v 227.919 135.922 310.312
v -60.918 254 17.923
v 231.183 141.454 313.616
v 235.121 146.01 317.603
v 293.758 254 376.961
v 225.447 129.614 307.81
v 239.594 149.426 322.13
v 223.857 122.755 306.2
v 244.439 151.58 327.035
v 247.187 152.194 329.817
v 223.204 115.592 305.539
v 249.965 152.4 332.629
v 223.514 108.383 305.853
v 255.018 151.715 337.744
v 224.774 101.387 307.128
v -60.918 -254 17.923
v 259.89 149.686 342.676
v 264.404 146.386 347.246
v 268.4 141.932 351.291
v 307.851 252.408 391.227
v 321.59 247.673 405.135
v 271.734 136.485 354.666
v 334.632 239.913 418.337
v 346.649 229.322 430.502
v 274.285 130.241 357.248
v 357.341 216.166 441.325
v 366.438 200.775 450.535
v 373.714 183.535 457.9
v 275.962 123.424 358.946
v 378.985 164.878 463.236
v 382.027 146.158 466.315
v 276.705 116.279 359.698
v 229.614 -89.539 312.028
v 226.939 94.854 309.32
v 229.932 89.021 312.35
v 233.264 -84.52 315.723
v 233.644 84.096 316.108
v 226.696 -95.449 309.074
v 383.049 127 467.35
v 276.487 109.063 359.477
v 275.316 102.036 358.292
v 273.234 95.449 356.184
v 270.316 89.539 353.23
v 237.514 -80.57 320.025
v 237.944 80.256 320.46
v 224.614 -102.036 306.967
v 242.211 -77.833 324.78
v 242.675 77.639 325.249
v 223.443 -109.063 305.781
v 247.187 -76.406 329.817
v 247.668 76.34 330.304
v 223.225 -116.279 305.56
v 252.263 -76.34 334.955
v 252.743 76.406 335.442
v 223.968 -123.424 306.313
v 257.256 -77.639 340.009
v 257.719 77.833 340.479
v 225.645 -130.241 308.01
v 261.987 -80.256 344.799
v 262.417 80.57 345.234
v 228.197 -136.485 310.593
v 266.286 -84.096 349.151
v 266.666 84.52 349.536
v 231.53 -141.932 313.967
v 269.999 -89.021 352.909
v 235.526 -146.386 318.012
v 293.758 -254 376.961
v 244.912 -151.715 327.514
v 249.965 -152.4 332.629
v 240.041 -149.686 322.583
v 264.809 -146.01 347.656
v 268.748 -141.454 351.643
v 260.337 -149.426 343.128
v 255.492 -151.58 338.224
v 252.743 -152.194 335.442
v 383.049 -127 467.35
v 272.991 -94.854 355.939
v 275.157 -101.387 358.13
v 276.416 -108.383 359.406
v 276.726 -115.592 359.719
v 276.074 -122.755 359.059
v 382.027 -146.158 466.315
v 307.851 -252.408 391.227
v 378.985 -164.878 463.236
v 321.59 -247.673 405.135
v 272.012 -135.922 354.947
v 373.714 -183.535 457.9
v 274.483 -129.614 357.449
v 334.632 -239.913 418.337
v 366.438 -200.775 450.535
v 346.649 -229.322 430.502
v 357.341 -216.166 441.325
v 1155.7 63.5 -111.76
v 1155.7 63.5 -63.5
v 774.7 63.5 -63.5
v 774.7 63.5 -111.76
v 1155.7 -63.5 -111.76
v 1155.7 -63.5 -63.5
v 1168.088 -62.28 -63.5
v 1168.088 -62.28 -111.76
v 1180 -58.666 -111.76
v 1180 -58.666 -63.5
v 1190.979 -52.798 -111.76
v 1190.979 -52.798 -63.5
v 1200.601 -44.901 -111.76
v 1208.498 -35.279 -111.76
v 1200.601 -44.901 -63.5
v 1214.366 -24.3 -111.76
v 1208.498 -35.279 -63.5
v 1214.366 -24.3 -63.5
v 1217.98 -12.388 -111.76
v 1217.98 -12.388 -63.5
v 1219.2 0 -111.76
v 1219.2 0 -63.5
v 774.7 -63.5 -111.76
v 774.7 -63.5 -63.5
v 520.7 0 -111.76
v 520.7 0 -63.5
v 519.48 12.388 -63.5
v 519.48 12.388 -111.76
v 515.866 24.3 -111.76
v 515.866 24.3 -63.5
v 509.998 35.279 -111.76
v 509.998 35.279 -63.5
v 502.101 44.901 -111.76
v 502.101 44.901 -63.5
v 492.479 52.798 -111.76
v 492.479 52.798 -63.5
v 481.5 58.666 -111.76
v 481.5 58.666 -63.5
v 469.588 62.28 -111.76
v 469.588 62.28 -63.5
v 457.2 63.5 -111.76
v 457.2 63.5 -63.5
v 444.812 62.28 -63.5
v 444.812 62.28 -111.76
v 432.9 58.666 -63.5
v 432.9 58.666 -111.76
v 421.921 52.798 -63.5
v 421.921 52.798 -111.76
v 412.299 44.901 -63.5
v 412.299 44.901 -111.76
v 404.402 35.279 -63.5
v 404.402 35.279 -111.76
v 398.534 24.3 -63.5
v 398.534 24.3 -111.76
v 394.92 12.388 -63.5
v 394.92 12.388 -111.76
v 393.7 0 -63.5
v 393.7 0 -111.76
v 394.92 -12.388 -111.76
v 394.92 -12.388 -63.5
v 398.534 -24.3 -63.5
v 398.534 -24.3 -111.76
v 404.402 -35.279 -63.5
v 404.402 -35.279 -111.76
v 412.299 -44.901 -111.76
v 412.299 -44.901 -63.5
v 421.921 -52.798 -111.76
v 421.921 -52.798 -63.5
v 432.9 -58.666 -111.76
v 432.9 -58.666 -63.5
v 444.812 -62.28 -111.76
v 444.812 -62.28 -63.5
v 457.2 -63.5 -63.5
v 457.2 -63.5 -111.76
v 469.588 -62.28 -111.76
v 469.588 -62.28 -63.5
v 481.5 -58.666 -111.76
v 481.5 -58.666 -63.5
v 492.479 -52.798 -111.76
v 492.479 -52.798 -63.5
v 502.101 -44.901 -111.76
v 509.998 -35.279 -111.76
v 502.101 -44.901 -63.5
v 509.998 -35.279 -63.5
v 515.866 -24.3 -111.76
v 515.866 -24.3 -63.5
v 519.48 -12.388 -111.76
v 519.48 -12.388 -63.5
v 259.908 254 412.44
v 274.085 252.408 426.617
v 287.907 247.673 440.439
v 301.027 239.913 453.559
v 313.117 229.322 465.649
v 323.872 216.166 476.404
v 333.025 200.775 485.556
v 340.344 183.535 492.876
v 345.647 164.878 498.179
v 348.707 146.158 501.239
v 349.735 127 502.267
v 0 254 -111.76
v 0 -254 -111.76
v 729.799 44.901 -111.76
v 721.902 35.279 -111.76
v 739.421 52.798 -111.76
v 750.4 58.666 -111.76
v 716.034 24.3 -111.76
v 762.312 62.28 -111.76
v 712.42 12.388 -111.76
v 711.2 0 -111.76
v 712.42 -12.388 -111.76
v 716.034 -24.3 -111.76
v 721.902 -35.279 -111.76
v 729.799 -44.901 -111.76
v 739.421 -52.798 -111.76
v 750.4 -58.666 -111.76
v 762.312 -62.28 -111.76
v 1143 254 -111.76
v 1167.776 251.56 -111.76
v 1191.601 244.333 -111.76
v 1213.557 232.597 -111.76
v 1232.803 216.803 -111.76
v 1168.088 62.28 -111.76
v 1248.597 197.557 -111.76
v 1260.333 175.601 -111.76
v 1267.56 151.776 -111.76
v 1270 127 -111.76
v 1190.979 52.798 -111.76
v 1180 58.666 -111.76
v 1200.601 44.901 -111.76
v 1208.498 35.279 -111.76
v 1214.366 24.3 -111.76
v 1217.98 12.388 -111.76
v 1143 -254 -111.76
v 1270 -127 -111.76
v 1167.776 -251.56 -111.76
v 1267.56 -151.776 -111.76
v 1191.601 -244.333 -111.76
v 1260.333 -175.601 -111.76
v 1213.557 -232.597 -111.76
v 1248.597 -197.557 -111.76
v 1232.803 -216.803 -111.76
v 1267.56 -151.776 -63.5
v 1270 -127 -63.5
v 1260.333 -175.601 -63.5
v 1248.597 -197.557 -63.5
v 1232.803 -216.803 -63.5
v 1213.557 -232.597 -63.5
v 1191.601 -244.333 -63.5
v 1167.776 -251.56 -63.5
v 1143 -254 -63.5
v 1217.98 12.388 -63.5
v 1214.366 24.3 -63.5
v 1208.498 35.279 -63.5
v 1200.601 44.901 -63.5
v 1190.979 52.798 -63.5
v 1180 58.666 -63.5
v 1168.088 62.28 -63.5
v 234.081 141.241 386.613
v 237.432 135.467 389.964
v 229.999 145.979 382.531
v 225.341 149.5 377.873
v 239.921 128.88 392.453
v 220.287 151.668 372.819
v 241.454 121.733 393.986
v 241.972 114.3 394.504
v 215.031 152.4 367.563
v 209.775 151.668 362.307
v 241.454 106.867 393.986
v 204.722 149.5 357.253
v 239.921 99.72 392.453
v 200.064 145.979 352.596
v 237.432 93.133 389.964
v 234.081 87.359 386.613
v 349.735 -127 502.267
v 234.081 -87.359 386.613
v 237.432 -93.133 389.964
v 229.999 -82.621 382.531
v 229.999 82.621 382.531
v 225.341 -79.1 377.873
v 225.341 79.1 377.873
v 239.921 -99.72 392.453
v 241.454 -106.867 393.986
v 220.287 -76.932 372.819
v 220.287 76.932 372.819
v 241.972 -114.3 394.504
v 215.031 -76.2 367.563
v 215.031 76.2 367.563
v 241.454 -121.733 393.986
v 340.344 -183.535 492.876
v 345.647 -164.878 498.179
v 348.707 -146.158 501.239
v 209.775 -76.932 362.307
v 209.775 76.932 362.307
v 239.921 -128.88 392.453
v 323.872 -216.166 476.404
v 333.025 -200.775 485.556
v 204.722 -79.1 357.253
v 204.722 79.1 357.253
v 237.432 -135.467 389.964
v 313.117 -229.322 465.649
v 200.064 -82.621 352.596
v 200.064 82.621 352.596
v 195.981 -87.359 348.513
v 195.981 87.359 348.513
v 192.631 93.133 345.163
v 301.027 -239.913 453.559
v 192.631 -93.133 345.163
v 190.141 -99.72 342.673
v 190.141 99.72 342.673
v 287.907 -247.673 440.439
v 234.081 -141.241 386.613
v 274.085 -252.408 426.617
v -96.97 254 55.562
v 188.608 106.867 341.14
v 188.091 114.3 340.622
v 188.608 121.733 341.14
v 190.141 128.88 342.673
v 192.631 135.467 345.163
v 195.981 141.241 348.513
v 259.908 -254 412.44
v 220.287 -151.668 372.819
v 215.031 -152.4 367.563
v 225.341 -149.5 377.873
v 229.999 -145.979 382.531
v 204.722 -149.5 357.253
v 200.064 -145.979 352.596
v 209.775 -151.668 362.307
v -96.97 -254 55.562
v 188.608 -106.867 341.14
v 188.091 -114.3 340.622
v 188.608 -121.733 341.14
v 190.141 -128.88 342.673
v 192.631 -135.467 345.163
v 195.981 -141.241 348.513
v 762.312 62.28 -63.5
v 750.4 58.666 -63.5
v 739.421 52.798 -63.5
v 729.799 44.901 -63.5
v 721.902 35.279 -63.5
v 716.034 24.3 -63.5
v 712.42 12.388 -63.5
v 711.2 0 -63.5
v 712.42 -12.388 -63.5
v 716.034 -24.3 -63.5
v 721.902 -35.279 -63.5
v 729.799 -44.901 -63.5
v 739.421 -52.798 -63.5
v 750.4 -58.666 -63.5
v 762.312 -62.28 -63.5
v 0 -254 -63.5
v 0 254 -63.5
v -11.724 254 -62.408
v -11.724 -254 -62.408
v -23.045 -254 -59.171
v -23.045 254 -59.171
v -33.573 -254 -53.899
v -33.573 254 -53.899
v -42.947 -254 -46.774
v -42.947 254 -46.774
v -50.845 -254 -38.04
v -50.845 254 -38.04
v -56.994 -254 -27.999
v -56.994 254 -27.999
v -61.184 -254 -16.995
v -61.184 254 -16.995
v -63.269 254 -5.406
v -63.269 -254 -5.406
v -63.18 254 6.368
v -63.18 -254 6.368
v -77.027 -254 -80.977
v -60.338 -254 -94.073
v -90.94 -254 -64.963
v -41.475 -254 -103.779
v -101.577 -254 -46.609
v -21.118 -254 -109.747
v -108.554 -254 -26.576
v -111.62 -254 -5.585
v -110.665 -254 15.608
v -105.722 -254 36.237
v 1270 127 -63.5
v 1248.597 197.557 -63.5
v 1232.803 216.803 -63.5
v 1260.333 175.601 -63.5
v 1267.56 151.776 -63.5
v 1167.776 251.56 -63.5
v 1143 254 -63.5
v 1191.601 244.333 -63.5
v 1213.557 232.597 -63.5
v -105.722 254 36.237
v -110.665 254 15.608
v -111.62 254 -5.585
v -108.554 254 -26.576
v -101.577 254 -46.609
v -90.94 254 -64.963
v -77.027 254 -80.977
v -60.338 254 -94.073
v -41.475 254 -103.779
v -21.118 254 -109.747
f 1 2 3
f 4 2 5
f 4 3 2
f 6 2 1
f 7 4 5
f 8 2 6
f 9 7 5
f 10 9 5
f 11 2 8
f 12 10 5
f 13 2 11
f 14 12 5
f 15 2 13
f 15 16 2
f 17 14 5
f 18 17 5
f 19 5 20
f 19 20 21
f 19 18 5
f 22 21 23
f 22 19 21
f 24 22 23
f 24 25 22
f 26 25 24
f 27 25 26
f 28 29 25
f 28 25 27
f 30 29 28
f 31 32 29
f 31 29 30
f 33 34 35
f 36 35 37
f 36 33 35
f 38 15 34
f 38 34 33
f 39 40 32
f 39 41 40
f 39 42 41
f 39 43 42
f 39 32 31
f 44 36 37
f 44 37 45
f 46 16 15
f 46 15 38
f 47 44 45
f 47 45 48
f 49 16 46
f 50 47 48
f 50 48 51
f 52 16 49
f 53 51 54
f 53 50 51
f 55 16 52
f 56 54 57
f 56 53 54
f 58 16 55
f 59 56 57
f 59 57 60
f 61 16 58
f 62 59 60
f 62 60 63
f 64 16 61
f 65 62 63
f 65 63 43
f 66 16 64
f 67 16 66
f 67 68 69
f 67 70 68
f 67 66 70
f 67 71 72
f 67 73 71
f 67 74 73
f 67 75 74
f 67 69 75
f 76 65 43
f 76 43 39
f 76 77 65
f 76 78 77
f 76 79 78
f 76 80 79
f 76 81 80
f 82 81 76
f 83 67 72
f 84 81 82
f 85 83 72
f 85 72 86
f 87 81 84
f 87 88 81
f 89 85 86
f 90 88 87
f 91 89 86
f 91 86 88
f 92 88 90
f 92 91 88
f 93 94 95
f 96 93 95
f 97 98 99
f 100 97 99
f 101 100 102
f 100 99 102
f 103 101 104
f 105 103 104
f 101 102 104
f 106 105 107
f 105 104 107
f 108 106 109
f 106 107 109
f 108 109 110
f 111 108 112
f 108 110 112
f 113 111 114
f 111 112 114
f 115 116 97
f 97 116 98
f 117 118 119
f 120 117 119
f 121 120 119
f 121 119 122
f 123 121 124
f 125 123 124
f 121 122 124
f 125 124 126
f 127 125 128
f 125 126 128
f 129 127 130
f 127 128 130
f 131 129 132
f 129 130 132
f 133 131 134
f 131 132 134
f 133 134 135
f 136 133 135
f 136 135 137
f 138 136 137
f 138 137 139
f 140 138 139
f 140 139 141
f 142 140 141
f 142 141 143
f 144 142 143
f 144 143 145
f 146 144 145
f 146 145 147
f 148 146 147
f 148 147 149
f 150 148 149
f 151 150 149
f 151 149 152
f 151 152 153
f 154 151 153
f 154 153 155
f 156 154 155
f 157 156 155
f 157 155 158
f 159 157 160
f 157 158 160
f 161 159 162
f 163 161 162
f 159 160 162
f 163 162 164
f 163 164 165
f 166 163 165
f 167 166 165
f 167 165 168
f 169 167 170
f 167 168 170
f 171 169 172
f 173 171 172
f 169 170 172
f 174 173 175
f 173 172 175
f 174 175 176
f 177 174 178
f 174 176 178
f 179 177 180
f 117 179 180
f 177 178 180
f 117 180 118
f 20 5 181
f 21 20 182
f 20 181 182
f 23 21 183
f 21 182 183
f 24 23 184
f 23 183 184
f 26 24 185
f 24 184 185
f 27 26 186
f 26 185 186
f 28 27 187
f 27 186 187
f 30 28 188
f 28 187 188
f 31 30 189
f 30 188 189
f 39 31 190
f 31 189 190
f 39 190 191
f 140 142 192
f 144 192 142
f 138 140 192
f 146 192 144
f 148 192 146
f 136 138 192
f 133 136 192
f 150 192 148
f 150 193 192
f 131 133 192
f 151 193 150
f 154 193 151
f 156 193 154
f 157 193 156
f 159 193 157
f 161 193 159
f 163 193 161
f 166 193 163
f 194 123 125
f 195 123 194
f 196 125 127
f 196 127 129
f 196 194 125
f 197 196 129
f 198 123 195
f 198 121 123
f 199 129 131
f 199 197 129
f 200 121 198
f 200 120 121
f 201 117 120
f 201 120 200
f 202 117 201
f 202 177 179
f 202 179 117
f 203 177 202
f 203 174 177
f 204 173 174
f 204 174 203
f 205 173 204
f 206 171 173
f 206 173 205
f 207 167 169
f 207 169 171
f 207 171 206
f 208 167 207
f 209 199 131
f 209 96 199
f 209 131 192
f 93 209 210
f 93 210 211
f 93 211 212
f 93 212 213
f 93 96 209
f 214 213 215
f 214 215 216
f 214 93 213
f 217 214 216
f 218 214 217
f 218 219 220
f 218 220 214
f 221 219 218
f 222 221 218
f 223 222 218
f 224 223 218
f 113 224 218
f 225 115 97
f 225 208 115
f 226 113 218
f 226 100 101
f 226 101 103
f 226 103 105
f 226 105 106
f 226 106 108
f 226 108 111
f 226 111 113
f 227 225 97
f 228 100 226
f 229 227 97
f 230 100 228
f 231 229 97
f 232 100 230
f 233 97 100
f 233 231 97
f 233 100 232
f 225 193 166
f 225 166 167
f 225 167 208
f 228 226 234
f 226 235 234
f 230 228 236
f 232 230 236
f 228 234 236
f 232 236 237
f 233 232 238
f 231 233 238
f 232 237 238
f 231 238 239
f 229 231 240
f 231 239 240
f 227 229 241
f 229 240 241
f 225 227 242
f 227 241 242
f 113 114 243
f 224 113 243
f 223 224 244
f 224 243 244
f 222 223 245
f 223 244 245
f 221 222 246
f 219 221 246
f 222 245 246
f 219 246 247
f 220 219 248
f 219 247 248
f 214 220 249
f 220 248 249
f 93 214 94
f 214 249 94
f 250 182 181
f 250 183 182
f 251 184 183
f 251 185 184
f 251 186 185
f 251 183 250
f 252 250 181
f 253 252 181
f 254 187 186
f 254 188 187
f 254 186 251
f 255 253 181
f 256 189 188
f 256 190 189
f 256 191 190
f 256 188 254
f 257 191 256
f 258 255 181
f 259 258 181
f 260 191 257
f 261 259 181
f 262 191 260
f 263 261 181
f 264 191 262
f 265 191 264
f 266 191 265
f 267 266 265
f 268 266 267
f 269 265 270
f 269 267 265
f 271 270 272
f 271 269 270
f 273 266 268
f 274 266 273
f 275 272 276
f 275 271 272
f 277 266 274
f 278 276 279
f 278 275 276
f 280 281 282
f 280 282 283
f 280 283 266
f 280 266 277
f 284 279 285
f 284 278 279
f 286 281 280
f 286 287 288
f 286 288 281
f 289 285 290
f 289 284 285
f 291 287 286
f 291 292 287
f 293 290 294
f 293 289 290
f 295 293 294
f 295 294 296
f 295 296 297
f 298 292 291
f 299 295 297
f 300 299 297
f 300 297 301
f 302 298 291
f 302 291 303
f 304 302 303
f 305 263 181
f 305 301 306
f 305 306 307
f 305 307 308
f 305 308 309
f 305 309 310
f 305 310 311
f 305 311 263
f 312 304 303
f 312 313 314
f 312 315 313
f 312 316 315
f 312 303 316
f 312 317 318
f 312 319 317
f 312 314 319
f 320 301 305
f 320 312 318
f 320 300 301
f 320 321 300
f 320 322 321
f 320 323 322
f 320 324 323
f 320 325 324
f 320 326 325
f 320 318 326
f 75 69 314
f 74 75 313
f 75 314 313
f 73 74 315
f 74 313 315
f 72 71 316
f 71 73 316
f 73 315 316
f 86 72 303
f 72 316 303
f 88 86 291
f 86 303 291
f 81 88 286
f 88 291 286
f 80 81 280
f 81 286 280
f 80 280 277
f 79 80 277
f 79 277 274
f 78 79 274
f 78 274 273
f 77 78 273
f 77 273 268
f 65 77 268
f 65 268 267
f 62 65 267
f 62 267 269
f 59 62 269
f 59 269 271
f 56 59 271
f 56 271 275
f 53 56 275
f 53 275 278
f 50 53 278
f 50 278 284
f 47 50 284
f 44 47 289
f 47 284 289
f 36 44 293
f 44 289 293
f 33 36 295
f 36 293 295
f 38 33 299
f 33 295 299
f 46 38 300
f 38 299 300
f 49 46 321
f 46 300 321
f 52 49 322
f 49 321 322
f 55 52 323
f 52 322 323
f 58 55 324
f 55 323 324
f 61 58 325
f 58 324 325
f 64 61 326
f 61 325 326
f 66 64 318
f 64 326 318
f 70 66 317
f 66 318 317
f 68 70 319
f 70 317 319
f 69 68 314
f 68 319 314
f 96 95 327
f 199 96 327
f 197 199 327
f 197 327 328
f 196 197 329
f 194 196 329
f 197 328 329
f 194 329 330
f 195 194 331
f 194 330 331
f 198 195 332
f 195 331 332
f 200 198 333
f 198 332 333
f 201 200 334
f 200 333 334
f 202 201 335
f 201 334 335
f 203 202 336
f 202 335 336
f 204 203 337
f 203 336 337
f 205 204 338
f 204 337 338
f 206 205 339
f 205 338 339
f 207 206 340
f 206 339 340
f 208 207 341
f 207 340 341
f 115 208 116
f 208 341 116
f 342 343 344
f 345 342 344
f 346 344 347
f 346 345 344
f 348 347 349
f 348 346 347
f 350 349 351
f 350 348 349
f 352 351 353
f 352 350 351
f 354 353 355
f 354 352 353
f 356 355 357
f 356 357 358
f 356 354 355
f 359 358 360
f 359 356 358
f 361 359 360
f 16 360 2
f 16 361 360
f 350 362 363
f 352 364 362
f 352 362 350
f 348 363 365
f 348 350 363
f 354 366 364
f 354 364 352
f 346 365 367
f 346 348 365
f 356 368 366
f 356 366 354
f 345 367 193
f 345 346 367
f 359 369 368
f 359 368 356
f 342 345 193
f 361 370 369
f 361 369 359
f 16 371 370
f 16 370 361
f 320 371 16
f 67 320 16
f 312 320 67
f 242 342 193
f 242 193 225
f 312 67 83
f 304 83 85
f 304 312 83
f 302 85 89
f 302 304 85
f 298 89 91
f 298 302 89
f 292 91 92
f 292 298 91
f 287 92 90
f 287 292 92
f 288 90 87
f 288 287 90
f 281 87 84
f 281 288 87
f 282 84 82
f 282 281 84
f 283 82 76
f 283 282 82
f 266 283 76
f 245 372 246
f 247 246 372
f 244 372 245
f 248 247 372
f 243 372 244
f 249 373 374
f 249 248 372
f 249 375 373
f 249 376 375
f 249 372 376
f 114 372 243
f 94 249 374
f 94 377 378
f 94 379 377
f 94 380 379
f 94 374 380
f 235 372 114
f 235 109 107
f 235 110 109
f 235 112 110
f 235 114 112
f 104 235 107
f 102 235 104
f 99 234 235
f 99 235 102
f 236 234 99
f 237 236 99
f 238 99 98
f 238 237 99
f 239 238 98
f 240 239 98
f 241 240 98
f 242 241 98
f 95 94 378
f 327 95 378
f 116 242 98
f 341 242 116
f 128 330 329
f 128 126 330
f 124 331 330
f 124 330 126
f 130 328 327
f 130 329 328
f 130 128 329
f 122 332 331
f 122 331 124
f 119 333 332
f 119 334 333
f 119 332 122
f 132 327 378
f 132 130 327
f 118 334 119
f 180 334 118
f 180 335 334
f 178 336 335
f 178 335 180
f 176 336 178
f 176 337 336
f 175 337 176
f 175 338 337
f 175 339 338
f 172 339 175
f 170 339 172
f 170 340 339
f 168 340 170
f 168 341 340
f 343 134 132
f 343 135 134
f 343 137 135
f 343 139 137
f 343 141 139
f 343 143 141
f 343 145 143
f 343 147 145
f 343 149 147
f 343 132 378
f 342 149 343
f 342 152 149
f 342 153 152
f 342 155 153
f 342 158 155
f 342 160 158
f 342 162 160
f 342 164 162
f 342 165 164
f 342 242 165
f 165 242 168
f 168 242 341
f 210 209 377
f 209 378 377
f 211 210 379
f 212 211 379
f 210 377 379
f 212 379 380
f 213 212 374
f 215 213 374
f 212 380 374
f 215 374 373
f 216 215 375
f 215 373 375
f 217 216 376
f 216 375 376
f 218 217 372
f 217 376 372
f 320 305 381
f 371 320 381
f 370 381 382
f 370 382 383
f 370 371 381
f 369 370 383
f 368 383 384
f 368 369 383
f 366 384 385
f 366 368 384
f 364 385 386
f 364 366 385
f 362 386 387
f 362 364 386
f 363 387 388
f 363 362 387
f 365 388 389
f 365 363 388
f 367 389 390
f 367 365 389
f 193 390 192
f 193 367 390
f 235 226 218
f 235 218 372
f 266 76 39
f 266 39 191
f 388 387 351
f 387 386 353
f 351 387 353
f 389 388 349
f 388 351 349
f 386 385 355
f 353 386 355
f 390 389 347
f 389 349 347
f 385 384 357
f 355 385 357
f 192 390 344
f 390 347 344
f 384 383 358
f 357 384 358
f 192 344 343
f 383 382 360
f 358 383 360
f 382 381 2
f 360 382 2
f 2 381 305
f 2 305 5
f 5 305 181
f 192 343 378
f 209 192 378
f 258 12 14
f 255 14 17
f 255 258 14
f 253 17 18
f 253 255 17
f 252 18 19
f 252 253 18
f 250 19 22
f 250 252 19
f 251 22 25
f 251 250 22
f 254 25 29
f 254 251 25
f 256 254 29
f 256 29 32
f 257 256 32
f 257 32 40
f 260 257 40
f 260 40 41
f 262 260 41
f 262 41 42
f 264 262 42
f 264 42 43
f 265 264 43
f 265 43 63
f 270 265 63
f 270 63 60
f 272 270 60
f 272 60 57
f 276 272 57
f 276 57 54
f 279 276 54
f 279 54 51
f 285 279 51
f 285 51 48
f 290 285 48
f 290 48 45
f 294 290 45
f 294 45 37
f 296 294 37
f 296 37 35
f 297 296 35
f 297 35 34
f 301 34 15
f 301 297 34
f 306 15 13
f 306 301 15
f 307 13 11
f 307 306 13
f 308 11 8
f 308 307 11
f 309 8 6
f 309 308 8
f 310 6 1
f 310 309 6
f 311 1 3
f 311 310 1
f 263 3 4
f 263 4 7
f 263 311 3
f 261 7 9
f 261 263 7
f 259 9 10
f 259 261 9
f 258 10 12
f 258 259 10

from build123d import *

# Parameters (mm, degrees)
F1_DEPTH = 254
F2_R     = 63.5
F3_DEPTH = 48.261
F4_R     = 38.1
F5_DEPTH = 49.6377001669
F6_R     = 127
F7_R     = 127


# Not quite as in the source:
# - a pattern or mirror of a feature is missing from the dataset's text; its kind, count and spacing are read off the source's solid


with BuildPart() as f1:
    # F0 (on Front) → F1 (new body, symmetric)
    with BuildSketch(Plane.XZ):
        with BuildLine():
            Line((1270, -63.5), (0, -63.5))
            ThreePointArc((0, -63.5), (-50.8447137485, -38.0403086717), (-60.9180663091, 17.9231469658))
            Line((-60.9180663091, 17.9231469658), (383.0492185975, 467.3498327088))
            Line((383.0492185975, 467.3498327088), (349.7351963182, 502.2669276563))
            Line((349.7351963182, 502.2669276563), (-96.9701293302, 55.5616020078))
            ThreePointArc((-96.9701293302, 55.5616020078), (-96.6950418594, -56.0389728653), (0, -111.76))
            Line((0, -111.76), (1270, -111.76))
            Line((1270, -111.76), (1270, -63.5))
        make_face()
    extrude(amount=F1_DEPTH, both=True)

    # F2 (on face) → F3 (cut, through all)
    with BuildSketch(Plane.XY.offset(-63.5)):
        with BuildLine():
            ThreePointArc((1155.7, -63.5), (1200.6012806053, -44.9012806053), (1219.2, 0))
            ThreePointArc((1219.2, 0), (1200.6012806053, 44.9012806053), (1155.7, 63.5))
            ThreePointArc((1155.7, 63.5), (1092.2, 0), (1155.7, -63.5))
        make_face()
        with BuildLine():
            ThreePointArc((1155.7, -63.5), (1092.2, 0), (1155.7, 63.5))
            Line((1155.7, 63.5), (774.7, 63.5))
            ThreePointArc((774.7, 63.5), (819.6012806053, 44.9012806053), (838.2, 0))
            ThreePointArc((838.2, 0), (819.6012806053, -44.9012806053), (774.7, -63.5))
            Line((774.7, -63.5), (1155.7, -63.5))
        make_face()
        with BuildLine():
            ThreePointArc((838.2, 0), (819.6012806053, 44.9012806053), (774.7, 63.5))
            ThreePointArc((774.7, 63.5), (711.2, 0), (774.7, -63.5))
            ThreePointArc((774.7, -63.5), (819.6012806053, -44.9012806053), (838.2, 0))
        make_face()
        with Locations((457.2, 0)):
            Circle(F2_R)
    extrude(amount=-F3_DEPTH, mode=Mode.SUBTRACT)

    # F4 (on face) → F5 (cut, through all)
    with BuildSketch(Plane(origin=(-76.265865669, 0, 76.265865669), x_dir=(0, -1, 0), z_dir=(-0.7071067812, 0, 0.7071067812))):
        with Locations((114.3, 411.9564794477)):
            Circle(F4_R)
    f5 = extrude(amount=-F5_DEPTH, mode=Mode.SUBTRACT)

    # F5_copies: F5 across plane
    add(f5.mirror(Plane.ZX.offset(-1e-06)), mode=Mode.SUBTRACT)

    # F6
    f6_edges = [f1.edges().sort_by_distance(p)[0] for p in [
        (366.392207, 254, 484.80838),
        (366.392207, -254, 484.80838),
    ]]
    fillet(f6_edges, radius=F6_R)

    # F7
    f7_edges = [f1.edges().sort_by_distance(p)[0] for p in [
        (1270, 254, -87.63),
        (1270, -254, -87.63),
    ]]
    fillet(f7_edges, radius=F7_R)


solid = f1.part
